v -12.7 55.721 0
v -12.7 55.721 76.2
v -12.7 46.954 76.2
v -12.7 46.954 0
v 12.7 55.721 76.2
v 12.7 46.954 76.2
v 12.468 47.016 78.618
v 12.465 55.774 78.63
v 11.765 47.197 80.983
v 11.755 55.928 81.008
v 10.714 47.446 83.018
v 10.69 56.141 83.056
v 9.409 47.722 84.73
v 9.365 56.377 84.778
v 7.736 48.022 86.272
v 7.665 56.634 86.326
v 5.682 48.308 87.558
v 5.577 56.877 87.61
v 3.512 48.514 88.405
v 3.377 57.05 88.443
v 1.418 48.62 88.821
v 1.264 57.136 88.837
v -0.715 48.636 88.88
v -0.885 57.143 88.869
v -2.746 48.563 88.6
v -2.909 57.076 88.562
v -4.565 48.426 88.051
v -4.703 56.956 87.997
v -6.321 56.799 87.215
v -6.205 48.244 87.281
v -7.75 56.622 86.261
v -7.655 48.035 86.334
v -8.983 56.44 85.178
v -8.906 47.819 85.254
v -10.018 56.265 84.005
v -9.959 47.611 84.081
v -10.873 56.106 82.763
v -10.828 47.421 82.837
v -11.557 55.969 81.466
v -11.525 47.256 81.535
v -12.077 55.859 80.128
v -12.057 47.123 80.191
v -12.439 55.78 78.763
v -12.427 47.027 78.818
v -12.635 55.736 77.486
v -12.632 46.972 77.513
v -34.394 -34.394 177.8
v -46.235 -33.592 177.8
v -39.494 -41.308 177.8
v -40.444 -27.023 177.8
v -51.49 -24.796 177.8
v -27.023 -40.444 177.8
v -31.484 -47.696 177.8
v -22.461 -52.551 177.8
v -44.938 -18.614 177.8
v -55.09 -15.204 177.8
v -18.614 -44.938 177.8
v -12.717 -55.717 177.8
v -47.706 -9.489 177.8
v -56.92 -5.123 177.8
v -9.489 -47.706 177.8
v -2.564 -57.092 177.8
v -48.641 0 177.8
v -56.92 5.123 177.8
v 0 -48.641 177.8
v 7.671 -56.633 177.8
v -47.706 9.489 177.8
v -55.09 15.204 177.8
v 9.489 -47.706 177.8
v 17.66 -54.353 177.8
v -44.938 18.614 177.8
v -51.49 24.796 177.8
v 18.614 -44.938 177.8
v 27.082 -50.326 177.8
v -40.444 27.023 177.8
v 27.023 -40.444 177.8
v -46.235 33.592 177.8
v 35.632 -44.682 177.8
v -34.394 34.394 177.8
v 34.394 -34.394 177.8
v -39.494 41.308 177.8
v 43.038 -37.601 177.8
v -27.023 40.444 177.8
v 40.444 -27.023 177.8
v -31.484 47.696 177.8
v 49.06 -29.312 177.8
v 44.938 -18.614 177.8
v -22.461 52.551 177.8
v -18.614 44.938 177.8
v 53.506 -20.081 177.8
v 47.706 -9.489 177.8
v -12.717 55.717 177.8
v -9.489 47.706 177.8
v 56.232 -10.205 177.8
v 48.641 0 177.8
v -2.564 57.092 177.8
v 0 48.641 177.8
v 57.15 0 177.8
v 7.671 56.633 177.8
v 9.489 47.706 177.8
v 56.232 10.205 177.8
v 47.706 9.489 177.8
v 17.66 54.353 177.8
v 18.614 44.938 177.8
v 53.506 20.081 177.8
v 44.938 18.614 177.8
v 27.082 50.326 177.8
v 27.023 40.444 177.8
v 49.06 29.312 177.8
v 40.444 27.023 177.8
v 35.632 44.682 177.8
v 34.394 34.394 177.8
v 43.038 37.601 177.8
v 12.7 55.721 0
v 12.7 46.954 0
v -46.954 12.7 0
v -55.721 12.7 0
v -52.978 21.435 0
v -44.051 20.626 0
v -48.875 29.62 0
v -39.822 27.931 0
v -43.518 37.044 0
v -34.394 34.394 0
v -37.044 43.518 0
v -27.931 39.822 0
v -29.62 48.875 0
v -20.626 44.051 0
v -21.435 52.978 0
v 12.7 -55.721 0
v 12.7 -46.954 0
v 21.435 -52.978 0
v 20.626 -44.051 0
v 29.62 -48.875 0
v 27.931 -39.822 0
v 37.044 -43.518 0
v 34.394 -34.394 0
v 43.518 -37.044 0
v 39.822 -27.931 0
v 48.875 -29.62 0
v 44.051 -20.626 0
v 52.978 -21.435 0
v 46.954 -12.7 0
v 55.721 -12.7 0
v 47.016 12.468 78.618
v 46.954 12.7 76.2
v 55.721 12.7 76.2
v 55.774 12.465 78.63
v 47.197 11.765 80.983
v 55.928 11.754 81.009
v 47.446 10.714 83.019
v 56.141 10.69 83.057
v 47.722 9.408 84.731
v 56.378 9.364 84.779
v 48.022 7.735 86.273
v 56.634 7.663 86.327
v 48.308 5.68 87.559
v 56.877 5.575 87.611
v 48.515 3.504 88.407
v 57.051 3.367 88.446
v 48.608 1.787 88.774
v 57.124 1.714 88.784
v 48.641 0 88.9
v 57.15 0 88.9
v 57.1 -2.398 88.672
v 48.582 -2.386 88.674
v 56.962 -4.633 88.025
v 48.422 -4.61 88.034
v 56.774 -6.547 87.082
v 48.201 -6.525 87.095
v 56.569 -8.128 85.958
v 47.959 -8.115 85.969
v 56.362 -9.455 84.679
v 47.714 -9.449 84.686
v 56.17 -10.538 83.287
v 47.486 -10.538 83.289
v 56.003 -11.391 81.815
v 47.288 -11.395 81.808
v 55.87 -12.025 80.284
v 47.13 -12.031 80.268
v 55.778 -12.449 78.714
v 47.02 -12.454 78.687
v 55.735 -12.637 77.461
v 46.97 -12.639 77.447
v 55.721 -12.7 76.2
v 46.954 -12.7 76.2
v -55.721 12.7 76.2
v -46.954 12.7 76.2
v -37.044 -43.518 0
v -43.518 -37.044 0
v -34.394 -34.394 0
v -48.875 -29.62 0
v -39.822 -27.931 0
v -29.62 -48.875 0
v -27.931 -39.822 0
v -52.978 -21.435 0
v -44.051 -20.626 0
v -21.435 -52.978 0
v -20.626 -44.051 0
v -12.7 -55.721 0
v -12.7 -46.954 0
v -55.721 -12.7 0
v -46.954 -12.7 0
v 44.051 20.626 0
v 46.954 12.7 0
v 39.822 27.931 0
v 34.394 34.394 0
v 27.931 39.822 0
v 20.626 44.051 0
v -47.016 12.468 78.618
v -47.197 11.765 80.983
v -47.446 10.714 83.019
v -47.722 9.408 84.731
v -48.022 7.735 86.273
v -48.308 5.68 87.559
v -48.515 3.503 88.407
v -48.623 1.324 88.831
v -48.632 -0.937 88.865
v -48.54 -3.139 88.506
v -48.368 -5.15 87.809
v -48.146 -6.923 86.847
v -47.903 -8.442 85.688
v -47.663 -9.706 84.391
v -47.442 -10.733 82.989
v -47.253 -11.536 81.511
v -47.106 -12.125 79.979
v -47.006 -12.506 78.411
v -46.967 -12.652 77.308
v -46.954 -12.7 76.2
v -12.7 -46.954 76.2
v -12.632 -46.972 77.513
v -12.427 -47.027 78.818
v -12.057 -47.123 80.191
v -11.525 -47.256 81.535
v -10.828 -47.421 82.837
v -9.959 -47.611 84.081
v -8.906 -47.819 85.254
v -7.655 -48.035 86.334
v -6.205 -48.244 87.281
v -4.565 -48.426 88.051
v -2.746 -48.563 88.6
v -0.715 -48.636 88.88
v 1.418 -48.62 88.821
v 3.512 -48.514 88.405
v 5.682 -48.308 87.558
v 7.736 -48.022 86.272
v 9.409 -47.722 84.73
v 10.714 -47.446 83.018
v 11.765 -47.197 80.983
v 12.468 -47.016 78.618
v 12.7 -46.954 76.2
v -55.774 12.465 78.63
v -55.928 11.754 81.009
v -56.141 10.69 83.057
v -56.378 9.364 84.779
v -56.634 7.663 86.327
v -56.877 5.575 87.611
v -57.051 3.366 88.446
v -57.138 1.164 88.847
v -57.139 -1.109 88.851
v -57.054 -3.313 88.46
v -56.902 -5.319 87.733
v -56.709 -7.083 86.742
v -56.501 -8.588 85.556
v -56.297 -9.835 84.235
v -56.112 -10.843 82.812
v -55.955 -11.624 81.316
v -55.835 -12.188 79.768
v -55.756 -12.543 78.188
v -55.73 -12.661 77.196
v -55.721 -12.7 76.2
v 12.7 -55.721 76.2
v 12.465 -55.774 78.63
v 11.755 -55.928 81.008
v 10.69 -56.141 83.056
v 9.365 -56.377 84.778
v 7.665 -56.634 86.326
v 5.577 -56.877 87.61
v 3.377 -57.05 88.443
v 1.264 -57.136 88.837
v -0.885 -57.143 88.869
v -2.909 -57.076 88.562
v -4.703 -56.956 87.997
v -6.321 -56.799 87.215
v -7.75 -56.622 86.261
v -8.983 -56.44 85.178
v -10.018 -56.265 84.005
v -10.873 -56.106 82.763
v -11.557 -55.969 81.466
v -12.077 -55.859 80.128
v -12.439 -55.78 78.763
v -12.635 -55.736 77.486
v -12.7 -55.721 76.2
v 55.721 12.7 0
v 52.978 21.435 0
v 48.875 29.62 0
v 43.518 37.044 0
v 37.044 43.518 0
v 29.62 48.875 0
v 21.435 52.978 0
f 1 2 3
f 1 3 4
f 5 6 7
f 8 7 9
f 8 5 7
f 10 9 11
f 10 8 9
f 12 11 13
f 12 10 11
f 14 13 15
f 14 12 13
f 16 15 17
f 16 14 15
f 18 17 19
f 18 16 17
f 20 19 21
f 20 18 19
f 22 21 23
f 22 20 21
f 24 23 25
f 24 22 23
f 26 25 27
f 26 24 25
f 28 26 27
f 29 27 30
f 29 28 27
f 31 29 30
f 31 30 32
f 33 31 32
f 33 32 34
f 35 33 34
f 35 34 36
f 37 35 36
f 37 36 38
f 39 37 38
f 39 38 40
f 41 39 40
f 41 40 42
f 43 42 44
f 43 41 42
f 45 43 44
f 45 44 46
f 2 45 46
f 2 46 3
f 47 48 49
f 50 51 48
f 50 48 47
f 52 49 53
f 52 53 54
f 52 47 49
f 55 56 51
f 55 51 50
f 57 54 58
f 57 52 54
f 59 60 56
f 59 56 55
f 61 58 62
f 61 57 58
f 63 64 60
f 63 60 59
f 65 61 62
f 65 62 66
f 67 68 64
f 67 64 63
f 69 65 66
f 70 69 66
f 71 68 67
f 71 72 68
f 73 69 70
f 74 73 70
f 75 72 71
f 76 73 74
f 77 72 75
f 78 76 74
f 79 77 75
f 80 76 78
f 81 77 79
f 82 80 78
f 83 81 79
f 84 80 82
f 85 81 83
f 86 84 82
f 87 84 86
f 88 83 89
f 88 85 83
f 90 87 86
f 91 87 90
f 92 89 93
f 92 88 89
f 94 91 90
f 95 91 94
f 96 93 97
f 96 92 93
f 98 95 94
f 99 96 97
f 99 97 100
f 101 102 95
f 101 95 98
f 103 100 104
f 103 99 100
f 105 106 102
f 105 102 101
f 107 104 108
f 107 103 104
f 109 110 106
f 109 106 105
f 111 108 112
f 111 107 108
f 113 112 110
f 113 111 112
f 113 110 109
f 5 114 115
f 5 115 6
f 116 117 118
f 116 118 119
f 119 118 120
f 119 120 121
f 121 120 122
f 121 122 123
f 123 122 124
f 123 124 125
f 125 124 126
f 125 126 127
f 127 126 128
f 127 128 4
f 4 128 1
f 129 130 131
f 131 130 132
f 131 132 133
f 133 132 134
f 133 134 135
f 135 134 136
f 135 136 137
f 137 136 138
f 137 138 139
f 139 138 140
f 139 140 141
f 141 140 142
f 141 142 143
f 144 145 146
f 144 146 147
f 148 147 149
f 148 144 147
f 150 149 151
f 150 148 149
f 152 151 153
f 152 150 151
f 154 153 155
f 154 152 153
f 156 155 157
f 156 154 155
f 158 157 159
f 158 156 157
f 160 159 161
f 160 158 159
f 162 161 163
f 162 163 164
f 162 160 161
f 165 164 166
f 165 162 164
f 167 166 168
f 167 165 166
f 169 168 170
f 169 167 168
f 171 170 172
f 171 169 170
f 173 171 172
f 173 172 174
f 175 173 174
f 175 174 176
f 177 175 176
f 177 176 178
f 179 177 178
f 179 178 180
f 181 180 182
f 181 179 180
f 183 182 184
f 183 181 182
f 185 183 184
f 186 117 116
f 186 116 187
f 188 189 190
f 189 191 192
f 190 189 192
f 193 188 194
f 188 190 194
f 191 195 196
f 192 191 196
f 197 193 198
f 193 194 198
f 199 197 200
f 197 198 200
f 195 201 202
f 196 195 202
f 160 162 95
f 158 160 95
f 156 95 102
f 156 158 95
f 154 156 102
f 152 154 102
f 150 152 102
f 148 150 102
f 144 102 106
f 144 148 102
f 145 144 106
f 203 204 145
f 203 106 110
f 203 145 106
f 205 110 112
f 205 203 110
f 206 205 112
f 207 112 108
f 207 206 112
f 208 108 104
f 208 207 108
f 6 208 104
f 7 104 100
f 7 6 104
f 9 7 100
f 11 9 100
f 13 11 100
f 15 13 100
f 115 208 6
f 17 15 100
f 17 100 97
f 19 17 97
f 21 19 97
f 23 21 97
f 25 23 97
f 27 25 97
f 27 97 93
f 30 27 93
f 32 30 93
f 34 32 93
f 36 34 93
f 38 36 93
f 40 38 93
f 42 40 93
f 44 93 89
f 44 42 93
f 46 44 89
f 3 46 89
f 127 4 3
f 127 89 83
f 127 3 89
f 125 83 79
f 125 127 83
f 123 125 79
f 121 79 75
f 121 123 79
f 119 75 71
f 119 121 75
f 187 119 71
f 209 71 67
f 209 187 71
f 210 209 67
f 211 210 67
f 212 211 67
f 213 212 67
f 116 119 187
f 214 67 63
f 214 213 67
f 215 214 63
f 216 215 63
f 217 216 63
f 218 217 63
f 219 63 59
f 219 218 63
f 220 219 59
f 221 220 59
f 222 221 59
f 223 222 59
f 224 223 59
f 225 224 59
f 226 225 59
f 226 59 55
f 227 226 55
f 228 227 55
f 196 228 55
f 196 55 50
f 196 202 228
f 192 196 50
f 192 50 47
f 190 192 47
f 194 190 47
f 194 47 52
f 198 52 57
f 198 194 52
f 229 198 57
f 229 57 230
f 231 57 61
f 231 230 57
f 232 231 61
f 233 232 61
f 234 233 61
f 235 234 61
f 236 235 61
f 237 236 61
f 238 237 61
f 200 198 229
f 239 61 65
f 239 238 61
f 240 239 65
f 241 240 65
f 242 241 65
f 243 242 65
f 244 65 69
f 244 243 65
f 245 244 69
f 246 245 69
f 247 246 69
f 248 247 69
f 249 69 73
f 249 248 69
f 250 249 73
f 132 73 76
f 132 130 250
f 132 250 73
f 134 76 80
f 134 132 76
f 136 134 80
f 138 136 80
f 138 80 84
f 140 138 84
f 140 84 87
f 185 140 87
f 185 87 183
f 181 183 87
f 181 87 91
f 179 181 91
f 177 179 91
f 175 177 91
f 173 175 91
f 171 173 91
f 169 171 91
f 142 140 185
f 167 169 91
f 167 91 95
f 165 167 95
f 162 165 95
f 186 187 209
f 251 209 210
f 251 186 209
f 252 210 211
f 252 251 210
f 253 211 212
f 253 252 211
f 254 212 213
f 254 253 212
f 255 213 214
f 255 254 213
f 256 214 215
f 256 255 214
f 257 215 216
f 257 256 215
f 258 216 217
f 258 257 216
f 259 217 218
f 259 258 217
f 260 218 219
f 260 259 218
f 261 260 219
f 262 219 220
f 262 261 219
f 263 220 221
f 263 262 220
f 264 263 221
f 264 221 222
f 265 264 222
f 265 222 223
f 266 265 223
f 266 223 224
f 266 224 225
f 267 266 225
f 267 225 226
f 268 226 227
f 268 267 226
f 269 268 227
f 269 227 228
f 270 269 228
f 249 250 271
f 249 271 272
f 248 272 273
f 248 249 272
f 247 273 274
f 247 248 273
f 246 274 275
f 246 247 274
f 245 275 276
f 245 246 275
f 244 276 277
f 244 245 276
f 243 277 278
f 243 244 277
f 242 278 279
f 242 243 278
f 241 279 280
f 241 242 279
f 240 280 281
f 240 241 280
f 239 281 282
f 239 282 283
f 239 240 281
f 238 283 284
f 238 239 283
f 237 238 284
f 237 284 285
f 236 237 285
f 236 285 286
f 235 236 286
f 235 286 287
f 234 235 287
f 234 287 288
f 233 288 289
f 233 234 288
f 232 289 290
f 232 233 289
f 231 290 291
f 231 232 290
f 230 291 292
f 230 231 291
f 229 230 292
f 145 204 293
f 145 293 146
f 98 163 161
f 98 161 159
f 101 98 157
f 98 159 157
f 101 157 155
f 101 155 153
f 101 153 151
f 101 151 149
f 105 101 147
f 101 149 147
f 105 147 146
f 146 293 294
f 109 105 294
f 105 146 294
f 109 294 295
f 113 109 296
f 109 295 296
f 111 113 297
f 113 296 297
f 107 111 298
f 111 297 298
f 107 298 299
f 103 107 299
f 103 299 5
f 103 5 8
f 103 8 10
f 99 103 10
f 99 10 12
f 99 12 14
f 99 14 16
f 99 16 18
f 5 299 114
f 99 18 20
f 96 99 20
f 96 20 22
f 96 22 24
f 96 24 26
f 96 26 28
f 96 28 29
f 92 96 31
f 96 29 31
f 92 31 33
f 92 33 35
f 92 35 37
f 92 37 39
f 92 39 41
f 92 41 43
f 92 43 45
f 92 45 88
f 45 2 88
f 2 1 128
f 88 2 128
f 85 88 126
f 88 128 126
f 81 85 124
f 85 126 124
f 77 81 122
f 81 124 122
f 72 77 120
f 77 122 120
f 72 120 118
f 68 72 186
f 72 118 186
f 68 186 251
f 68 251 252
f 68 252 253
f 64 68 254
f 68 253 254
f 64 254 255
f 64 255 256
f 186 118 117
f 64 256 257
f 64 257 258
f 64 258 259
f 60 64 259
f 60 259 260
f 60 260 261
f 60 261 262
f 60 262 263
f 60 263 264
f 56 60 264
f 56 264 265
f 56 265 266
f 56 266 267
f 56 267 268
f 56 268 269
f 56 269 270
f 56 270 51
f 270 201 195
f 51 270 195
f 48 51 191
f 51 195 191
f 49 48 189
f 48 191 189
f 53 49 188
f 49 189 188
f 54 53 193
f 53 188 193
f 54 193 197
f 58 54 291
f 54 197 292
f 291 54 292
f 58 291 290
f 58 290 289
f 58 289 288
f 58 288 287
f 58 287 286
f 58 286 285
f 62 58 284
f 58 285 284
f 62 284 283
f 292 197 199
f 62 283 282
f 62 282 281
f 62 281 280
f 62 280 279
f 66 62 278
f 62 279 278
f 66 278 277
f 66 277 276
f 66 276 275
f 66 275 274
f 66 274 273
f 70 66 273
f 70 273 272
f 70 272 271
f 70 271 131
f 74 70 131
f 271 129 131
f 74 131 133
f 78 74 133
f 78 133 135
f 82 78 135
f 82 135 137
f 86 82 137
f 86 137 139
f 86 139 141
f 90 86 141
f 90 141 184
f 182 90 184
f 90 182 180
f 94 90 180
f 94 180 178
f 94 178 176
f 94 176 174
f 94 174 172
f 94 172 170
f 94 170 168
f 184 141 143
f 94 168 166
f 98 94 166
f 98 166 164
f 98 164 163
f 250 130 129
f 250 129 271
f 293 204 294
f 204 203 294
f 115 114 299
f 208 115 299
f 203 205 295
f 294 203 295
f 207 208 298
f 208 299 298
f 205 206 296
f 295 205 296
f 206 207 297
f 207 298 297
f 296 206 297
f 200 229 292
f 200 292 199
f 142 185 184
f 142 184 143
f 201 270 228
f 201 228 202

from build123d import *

# Parameters (mm, degrees)
SKETCH12_R          = 57.15
SKETCH12_R_2        = 48.641
BOSS_EXTRUDE1_DEPTH = 177.8
CUT_EXTRUDE1_DEPTH  = 196.30766754
CIRPATTERN1_COUNT   = 2
CIRPATTERN1_ANGLE   = 90


with BuildPart() as part:
    # Sketch12 → Boss-Extrude1 (new body)
    with BuildSketch(Plane.XY):
        Circle(SKETCH12_R)
        Circle(SKETCH12_R_2, mode=Mode.SUBTRACT)
    extrude(amount=BOSS_EXTRUDE1_DEPTH)

    # Sketch13 → Cut-Extrude1 (cut, symmetric)
    with BuildSketch(Plane(origin=(0, 0, 0), x_dir=(1, 0, 0), z_dir=(0, 1, 0))):
        with BuildLine():
            Line((-12.7, 0), (12.7, 0))
            Line((12.7, 0), (12.7, -76.2))
            ThreePointArc((12.7, -76.2), (0, -88.9), (-12.7, -76.2))
            Line((-12.7, -76.2), (-12.7, 0))
        make_face()
    cut_extrude1 = extrude(amount=CUT_EXTRUDE1_DEPTH, both=True, mode=Mode.SUBTRACT)

    # CirPattern1: Cut-Extrude1 ×2 about axis
    cirpattern1_axis = Axis((0, 0, 0), (0, 0, 1))
    for i in range(1, CIRPATTERN1_COUNT):
        add(cut_extrude1.rotate(cirpattern1_axis, i * CIRPATTERN1_ANGLE / (CIRPATTERN1_COUNT - 1)), mode=Mode.SUBTRACT)


solid = part.part
